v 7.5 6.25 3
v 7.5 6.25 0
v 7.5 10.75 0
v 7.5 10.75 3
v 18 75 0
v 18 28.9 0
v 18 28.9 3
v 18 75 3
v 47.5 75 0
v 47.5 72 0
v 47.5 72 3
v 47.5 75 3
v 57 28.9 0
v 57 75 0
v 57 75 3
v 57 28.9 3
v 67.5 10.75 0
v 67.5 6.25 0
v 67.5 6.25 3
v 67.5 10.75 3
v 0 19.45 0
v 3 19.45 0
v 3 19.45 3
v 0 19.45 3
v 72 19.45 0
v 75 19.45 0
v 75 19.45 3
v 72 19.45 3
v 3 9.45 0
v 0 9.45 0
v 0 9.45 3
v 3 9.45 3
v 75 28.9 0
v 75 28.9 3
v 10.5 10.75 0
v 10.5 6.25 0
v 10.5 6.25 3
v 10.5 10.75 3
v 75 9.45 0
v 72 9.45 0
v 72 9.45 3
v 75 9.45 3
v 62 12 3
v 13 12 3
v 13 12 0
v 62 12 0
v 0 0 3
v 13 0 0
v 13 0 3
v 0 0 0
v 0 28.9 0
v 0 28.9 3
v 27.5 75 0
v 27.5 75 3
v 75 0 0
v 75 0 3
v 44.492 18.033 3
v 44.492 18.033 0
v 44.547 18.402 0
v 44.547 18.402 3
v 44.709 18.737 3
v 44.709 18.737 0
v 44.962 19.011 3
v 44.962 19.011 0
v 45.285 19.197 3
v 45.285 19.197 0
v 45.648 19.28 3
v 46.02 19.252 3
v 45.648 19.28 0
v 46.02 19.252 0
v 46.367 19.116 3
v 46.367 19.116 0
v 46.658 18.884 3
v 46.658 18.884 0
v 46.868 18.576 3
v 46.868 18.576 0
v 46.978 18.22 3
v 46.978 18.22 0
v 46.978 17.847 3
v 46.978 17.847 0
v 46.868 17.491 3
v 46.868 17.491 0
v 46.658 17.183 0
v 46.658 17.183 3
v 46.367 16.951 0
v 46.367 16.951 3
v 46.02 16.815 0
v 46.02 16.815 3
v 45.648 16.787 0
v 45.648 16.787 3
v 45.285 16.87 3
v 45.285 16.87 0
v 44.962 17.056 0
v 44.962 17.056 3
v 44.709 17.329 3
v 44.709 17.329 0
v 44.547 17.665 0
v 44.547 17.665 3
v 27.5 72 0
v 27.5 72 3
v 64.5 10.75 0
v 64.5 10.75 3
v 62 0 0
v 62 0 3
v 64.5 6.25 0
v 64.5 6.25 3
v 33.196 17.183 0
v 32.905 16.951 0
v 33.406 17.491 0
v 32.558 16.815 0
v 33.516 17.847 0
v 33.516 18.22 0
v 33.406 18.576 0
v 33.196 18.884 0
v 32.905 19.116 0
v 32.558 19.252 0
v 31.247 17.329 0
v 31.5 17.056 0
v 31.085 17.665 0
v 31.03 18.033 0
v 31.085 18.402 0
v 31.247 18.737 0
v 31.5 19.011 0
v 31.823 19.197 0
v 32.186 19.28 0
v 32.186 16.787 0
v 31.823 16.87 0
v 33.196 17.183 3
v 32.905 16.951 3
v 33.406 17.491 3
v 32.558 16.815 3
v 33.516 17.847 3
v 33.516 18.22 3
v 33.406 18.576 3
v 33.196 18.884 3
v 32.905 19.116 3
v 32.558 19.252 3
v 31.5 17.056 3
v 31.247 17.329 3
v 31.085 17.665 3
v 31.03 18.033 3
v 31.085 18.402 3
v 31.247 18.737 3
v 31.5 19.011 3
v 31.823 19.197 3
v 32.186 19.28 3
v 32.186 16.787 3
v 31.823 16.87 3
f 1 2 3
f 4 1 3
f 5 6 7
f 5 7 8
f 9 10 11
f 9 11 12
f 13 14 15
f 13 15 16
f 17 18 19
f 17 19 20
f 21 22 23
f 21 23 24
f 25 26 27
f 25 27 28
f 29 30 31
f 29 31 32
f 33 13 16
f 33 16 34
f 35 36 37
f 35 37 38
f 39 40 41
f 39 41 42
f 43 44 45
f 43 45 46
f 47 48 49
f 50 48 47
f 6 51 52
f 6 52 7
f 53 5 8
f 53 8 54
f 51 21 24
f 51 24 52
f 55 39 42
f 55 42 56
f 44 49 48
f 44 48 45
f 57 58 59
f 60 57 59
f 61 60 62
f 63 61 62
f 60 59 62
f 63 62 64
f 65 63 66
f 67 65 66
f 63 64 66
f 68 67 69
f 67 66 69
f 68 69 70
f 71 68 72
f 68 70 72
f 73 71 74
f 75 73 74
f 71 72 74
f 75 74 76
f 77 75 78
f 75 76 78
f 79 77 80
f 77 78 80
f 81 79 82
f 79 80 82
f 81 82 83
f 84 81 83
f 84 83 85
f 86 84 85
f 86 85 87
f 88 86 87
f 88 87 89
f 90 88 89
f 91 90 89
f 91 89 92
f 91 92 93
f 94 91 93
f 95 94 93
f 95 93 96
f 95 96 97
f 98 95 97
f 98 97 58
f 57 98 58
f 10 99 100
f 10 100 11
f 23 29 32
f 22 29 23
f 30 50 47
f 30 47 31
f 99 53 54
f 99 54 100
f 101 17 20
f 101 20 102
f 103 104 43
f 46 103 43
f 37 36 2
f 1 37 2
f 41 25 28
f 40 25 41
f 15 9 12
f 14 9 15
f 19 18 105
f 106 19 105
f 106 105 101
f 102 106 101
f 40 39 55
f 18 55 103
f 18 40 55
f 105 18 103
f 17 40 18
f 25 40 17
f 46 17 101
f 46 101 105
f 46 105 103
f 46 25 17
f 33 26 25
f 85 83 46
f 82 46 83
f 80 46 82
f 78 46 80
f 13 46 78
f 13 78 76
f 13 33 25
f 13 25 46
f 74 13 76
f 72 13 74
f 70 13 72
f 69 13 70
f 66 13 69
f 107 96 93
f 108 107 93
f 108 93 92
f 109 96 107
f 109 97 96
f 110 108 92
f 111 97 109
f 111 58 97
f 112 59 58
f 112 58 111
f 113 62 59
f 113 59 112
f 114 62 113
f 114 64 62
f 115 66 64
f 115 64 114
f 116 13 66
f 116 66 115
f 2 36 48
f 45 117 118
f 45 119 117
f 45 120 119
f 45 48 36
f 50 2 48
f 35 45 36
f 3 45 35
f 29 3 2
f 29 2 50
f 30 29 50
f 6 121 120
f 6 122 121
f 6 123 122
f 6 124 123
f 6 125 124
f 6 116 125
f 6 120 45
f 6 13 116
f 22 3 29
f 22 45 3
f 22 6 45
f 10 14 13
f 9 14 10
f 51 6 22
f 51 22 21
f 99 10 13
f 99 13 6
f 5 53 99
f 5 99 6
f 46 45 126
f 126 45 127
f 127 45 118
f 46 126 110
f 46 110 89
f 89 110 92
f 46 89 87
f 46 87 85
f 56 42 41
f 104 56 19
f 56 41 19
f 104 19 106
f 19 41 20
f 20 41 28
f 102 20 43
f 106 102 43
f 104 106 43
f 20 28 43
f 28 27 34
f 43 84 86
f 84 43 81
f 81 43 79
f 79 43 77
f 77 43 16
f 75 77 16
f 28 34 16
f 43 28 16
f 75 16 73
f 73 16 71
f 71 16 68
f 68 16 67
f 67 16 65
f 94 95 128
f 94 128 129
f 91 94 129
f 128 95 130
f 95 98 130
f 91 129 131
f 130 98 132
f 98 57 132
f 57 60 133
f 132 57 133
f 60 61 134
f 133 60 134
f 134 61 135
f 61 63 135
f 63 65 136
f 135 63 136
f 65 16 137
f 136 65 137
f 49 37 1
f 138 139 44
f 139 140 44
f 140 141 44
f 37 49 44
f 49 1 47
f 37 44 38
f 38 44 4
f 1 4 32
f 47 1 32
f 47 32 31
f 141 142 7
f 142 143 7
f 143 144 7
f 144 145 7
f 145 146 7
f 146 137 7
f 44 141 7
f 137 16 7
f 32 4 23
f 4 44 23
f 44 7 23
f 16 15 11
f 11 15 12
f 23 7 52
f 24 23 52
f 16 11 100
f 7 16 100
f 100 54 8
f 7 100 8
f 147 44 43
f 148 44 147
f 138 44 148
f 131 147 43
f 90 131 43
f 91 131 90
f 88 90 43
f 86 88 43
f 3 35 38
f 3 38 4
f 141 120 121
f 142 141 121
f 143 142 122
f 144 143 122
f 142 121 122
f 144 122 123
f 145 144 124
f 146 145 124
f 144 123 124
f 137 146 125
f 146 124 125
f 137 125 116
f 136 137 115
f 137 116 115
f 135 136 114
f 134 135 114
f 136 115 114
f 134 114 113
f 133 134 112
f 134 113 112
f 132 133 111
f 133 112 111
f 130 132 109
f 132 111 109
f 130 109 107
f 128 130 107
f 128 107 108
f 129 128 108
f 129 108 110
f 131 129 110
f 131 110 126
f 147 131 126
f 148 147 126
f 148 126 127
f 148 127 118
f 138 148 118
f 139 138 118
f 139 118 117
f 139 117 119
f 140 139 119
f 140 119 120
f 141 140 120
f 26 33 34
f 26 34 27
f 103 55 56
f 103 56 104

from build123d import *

# Parameters (mm, degrees)
SALIENTE_EXTRUIR1_DEPTH = 3
CROQUIS4_W              = 49
CROQUIS4_H              = 12
CORTAR_EXTRUIR2_DEPTH   = 10
CROQUIS5_R              = 1.25
CORTAR_EXTRUIR3_DEPTH   = 10
CROQUIS6_W              = 3
CROQUIS6_H              = 4.5
CORTAR_EXTRUIR4_DEPTH   = 10


with BuildPart() as part:
    # Croquis1 → Saliente-Extruir1 (new body)
    with BuildSketch(Plane.XY):
        Polygon((0, 28.9), (18, 28.9), (18, 75), (27.5, 75), (27.5, 72), (47.5, 72), (47.5, 75), (57, 75), (57, 28.9), (75, 28.9), (75, 19.45), (72, 19.45), (72, 9.45), (75, 9.45), (75, 0), (0, 0), (0, 9.45), (3, 9.45), (3, 19.45), (0, 19.45), align=None)
    extrude(amount=SALIENTE_EXTRUIR1_DEPTH)

    # Croquis4 → Cortar-Extruir2 (cut)
    with BuildSketch(Plane.XY.offset(3)):
        with Locations((37.5, 6)):
            Rectangle(CROQUIS4_W, CROQUIS4_H)
    extrude(amount=-CORTAR_EXTRUIR2_DEPTH, mode=Mode.SUBTRACT)

    # Croquis5 → Cortar-Extruir3 (cut)
    with BuildSketch(Plane(origin=(0, 0, 0), x_dir=(-1, 0, 0), z_dir=(0, 0, -1))):
        with Locations((-32.279739901, 18.033331943)):
            Circle(CROQUIS5_R)
        with Locations((-45.741739901, 18.033331943)):
            Circle(CROQUIS5_R)
    extrude(amount=-CORTAR_EXTRUIR3_DEPTH, mode=Mode.SUBTRACT)

    # Croquis6 → Cortar-Extruir4 (cut)
    with BuildSketch(Plane(origin=(0, 0, 0), x_dir=(-1, 0, 0), z_dir=(0, 0, -1))):
        with Locations((-9, 8.5)):
            Rectangle(CROQUIS6_W, CROQUIS6_H)
        with Locations((-66, 8.5)):
            Rectangle(CROQUIS6_W, CROQUIS6_H)
    extrude(amount=-CORTAR_EXTRUIR4_DEPTH, mode=Mode.SUBTRACT)


solid = part.part
